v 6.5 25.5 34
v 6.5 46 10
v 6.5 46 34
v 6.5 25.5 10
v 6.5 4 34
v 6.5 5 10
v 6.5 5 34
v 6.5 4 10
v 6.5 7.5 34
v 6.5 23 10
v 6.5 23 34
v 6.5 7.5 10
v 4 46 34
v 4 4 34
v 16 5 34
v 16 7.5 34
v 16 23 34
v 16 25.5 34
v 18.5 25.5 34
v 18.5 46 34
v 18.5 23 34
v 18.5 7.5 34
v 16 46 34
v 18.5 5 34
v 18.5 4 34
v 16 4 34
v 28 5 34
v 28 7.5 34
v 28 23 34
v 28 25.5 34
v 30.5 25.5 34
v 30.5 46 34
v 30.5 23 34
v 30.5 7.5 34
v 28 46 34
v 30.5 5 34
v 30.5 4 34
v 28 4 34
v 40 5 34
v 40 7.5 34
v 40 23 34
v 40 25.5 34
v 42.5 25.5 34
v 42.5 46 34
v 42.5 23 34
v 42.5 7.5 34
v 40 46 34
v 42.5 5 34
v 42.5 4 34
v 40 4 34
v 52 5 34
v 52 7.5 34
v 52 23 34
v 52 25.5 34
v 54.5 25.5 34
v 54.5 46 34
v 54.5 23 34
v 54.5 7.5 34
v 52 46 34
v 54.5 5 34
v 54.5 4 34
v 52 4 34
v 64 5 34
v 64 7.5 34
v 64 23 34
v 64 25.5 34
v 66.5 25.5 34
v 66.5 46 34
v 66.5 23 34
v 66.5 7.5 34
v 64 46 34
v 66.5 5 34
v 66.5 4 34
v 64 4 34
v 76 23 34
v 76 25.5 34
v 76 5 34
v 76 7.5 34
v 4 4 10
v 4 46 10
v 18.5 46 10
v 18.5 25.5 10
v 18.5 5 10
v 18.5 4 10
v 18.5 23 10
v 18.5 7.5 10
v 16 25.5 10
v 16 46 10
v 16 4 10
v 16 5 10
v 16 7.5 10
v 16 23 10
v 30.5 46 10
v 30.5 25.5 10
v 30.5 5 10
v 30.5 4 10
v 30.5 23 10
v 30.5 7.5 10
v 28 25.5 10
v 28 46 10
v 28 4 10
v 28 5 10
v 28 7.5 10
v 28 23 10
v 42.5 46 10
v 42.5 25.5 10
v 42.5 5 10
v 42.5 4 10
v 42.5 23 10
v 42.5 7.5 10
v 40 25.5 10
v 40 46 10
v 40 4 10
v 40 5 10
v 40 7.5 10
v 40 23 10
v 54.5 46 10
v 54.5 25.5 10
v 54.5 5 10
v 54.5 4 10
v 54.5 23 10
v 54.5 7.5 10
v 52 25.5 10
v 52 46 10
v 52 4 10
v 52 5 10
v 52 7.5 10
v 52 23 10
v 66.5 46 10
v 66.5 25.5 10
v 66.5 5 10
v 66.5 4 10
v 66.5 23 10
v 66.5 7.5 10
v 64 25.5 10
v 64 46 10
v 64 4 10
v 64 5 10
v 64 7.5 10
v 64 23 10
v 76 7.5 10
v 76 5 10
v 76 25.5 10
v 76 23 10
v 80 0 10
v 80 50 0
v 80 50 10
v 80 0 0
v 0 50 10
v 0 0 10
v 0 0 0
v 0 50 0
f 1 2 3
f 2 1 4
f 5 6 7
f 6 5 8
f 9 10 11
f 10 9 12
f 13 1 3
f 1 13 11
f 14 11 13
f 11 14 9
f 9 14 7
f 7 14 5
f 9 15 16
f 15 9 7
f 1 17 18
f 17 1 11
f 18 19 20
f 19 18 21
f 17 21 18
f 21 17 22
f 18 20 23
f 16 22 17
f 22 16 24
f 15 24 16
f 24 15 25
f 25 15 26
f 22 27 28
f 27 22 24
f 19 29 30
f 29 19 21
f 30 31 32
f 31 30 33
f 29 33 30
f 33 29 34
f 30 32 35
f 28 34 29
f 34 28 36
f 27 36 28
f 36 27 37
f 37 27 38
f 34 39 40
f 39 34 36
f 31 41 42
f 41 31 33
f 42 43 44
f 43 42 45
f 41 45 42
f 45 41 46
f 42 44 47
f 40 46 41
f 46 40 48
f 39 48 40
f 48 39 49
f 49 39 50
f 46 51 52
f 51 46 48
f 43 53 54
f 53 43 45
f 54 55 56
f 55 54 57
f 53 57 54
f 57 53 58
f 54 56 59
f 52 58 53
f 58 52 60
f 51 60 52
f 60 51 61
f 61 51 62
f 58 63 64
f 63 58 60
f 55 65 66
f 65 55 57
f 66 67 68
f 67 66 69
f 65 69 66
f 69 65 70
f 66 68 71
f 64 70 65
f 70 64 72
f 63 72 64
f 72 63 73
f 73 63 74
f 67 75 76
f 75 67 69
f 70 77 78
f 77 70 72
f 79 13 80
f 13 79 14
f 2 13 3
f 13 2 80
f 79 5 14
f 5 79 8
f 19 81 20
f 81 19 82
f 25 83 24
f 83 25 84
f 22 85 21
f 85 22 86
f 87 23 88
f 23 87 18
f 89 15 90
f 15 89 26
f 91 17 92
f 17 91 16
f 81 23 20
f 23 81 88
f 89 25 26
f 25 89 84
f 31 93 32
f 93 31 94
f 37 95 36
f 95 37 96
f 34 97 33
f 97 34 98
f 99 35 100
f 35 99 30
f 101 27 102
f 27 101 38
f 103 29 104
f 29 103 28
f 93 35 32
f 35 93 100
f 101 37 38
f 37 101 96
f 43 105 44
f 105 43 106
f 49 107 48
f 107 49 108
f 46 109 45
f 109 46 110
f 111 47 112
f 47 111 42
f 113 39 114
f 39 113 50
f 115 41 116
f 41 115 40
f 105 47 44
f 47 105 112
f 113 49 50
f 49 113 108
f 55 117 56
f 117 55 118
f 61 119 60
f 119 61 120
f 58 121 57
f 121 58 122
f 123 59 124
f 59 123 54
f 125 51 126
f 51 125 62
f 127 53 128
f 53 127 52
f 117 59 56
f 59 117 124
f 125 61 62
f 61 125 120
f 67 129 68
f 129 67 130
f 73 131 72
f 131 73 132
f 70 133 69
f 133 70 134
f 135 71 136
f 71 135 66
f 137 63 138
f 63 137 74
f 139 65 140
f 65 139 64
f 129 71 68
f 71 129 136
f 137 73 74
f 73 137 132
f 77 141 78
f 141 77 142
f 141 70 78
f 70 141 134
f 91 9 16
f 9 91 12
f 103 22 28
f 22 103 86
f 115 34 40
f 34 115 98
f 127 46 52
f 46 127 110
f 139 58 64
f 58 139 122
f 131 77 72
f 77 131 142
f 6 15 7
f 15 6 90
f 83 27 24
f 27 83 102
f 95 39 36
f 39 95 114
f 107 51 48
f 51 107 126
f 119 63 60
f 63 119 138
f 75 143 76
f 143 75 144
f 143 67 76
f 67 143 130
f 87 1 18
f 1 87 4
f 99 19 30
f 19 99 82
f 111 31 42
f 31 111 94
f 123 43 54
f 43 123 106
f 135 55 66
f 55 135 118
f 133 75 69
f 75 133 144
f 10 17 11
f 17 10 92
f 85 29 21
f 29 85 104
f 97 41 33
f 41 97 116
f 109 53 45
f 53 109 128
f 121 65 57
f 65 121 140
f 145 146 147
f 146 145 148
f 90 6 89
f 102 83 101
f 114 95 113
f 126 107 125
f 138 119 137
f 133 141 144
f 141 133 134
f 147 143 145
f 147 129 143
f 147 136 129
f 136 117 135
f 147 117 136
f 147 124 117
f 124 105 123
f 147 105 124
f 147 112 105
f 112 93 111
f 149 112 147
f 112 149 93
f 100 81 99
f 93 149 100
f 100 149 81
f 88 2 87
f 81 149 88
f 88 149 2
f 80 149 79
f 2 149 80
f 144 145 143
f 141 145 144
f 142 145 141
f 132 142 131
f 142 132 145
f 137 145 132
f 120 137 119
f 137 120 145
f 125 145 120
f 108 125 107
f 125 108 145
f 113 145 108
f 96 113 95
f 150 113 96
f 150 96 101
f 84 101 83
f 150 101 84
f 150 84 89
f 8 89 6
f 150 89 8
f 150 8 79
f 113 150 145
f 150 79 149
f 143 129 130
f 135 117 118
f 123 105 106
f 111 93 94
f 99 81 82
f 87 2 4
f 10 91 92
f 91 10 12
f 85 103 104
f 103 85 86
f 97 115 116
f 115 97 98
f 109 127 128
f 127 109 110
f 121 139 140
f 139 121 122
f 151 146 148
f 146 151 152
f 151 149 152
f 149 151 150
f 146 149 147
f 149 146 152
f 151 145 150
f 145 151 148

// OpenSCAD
$fn = 32;

// ----------------------------------------------------------------------
// Heatsink: cross fin block
// ----------------------------------------------------------------------

// --- parameters (mm) ---
base_l = 80;              // base length, X
base_w = 50;              // base width, Y
base_t = 10;              // base plate thickness
fin_h = 25;               // fin height above the base
fin_t = 2.5;              // fin thickness
edge = 4;                 // margin from the base ends
pitch = 12;               // fin pitch
rib_pitch = 18;           // cross rib pitch

n_fins = floor((base_l - 2 * edge - fin_t) / pitch) + 1;  // fin count
total_h = base_t + fin_h - 1;  // overall height
n_ribs = floor((base_w - 2 * edge) / rib_pitch);  // rib count

union() {
  cube([base_l, base_w, base_t]);
  for (i = [0 : n_fins - 1])
    translate([edge + i * pitch, edge, base_t - 1])
      cube([fin_t, base_w - 2 * edge, fin_h]);
  for (i = [0 : n_ribs - 1])
    translate([edge, edge + 1 + i * rib_pitch, base_t - 1])
      cube([base_l - 2 * edge, fin_t, fin_h]);
}
